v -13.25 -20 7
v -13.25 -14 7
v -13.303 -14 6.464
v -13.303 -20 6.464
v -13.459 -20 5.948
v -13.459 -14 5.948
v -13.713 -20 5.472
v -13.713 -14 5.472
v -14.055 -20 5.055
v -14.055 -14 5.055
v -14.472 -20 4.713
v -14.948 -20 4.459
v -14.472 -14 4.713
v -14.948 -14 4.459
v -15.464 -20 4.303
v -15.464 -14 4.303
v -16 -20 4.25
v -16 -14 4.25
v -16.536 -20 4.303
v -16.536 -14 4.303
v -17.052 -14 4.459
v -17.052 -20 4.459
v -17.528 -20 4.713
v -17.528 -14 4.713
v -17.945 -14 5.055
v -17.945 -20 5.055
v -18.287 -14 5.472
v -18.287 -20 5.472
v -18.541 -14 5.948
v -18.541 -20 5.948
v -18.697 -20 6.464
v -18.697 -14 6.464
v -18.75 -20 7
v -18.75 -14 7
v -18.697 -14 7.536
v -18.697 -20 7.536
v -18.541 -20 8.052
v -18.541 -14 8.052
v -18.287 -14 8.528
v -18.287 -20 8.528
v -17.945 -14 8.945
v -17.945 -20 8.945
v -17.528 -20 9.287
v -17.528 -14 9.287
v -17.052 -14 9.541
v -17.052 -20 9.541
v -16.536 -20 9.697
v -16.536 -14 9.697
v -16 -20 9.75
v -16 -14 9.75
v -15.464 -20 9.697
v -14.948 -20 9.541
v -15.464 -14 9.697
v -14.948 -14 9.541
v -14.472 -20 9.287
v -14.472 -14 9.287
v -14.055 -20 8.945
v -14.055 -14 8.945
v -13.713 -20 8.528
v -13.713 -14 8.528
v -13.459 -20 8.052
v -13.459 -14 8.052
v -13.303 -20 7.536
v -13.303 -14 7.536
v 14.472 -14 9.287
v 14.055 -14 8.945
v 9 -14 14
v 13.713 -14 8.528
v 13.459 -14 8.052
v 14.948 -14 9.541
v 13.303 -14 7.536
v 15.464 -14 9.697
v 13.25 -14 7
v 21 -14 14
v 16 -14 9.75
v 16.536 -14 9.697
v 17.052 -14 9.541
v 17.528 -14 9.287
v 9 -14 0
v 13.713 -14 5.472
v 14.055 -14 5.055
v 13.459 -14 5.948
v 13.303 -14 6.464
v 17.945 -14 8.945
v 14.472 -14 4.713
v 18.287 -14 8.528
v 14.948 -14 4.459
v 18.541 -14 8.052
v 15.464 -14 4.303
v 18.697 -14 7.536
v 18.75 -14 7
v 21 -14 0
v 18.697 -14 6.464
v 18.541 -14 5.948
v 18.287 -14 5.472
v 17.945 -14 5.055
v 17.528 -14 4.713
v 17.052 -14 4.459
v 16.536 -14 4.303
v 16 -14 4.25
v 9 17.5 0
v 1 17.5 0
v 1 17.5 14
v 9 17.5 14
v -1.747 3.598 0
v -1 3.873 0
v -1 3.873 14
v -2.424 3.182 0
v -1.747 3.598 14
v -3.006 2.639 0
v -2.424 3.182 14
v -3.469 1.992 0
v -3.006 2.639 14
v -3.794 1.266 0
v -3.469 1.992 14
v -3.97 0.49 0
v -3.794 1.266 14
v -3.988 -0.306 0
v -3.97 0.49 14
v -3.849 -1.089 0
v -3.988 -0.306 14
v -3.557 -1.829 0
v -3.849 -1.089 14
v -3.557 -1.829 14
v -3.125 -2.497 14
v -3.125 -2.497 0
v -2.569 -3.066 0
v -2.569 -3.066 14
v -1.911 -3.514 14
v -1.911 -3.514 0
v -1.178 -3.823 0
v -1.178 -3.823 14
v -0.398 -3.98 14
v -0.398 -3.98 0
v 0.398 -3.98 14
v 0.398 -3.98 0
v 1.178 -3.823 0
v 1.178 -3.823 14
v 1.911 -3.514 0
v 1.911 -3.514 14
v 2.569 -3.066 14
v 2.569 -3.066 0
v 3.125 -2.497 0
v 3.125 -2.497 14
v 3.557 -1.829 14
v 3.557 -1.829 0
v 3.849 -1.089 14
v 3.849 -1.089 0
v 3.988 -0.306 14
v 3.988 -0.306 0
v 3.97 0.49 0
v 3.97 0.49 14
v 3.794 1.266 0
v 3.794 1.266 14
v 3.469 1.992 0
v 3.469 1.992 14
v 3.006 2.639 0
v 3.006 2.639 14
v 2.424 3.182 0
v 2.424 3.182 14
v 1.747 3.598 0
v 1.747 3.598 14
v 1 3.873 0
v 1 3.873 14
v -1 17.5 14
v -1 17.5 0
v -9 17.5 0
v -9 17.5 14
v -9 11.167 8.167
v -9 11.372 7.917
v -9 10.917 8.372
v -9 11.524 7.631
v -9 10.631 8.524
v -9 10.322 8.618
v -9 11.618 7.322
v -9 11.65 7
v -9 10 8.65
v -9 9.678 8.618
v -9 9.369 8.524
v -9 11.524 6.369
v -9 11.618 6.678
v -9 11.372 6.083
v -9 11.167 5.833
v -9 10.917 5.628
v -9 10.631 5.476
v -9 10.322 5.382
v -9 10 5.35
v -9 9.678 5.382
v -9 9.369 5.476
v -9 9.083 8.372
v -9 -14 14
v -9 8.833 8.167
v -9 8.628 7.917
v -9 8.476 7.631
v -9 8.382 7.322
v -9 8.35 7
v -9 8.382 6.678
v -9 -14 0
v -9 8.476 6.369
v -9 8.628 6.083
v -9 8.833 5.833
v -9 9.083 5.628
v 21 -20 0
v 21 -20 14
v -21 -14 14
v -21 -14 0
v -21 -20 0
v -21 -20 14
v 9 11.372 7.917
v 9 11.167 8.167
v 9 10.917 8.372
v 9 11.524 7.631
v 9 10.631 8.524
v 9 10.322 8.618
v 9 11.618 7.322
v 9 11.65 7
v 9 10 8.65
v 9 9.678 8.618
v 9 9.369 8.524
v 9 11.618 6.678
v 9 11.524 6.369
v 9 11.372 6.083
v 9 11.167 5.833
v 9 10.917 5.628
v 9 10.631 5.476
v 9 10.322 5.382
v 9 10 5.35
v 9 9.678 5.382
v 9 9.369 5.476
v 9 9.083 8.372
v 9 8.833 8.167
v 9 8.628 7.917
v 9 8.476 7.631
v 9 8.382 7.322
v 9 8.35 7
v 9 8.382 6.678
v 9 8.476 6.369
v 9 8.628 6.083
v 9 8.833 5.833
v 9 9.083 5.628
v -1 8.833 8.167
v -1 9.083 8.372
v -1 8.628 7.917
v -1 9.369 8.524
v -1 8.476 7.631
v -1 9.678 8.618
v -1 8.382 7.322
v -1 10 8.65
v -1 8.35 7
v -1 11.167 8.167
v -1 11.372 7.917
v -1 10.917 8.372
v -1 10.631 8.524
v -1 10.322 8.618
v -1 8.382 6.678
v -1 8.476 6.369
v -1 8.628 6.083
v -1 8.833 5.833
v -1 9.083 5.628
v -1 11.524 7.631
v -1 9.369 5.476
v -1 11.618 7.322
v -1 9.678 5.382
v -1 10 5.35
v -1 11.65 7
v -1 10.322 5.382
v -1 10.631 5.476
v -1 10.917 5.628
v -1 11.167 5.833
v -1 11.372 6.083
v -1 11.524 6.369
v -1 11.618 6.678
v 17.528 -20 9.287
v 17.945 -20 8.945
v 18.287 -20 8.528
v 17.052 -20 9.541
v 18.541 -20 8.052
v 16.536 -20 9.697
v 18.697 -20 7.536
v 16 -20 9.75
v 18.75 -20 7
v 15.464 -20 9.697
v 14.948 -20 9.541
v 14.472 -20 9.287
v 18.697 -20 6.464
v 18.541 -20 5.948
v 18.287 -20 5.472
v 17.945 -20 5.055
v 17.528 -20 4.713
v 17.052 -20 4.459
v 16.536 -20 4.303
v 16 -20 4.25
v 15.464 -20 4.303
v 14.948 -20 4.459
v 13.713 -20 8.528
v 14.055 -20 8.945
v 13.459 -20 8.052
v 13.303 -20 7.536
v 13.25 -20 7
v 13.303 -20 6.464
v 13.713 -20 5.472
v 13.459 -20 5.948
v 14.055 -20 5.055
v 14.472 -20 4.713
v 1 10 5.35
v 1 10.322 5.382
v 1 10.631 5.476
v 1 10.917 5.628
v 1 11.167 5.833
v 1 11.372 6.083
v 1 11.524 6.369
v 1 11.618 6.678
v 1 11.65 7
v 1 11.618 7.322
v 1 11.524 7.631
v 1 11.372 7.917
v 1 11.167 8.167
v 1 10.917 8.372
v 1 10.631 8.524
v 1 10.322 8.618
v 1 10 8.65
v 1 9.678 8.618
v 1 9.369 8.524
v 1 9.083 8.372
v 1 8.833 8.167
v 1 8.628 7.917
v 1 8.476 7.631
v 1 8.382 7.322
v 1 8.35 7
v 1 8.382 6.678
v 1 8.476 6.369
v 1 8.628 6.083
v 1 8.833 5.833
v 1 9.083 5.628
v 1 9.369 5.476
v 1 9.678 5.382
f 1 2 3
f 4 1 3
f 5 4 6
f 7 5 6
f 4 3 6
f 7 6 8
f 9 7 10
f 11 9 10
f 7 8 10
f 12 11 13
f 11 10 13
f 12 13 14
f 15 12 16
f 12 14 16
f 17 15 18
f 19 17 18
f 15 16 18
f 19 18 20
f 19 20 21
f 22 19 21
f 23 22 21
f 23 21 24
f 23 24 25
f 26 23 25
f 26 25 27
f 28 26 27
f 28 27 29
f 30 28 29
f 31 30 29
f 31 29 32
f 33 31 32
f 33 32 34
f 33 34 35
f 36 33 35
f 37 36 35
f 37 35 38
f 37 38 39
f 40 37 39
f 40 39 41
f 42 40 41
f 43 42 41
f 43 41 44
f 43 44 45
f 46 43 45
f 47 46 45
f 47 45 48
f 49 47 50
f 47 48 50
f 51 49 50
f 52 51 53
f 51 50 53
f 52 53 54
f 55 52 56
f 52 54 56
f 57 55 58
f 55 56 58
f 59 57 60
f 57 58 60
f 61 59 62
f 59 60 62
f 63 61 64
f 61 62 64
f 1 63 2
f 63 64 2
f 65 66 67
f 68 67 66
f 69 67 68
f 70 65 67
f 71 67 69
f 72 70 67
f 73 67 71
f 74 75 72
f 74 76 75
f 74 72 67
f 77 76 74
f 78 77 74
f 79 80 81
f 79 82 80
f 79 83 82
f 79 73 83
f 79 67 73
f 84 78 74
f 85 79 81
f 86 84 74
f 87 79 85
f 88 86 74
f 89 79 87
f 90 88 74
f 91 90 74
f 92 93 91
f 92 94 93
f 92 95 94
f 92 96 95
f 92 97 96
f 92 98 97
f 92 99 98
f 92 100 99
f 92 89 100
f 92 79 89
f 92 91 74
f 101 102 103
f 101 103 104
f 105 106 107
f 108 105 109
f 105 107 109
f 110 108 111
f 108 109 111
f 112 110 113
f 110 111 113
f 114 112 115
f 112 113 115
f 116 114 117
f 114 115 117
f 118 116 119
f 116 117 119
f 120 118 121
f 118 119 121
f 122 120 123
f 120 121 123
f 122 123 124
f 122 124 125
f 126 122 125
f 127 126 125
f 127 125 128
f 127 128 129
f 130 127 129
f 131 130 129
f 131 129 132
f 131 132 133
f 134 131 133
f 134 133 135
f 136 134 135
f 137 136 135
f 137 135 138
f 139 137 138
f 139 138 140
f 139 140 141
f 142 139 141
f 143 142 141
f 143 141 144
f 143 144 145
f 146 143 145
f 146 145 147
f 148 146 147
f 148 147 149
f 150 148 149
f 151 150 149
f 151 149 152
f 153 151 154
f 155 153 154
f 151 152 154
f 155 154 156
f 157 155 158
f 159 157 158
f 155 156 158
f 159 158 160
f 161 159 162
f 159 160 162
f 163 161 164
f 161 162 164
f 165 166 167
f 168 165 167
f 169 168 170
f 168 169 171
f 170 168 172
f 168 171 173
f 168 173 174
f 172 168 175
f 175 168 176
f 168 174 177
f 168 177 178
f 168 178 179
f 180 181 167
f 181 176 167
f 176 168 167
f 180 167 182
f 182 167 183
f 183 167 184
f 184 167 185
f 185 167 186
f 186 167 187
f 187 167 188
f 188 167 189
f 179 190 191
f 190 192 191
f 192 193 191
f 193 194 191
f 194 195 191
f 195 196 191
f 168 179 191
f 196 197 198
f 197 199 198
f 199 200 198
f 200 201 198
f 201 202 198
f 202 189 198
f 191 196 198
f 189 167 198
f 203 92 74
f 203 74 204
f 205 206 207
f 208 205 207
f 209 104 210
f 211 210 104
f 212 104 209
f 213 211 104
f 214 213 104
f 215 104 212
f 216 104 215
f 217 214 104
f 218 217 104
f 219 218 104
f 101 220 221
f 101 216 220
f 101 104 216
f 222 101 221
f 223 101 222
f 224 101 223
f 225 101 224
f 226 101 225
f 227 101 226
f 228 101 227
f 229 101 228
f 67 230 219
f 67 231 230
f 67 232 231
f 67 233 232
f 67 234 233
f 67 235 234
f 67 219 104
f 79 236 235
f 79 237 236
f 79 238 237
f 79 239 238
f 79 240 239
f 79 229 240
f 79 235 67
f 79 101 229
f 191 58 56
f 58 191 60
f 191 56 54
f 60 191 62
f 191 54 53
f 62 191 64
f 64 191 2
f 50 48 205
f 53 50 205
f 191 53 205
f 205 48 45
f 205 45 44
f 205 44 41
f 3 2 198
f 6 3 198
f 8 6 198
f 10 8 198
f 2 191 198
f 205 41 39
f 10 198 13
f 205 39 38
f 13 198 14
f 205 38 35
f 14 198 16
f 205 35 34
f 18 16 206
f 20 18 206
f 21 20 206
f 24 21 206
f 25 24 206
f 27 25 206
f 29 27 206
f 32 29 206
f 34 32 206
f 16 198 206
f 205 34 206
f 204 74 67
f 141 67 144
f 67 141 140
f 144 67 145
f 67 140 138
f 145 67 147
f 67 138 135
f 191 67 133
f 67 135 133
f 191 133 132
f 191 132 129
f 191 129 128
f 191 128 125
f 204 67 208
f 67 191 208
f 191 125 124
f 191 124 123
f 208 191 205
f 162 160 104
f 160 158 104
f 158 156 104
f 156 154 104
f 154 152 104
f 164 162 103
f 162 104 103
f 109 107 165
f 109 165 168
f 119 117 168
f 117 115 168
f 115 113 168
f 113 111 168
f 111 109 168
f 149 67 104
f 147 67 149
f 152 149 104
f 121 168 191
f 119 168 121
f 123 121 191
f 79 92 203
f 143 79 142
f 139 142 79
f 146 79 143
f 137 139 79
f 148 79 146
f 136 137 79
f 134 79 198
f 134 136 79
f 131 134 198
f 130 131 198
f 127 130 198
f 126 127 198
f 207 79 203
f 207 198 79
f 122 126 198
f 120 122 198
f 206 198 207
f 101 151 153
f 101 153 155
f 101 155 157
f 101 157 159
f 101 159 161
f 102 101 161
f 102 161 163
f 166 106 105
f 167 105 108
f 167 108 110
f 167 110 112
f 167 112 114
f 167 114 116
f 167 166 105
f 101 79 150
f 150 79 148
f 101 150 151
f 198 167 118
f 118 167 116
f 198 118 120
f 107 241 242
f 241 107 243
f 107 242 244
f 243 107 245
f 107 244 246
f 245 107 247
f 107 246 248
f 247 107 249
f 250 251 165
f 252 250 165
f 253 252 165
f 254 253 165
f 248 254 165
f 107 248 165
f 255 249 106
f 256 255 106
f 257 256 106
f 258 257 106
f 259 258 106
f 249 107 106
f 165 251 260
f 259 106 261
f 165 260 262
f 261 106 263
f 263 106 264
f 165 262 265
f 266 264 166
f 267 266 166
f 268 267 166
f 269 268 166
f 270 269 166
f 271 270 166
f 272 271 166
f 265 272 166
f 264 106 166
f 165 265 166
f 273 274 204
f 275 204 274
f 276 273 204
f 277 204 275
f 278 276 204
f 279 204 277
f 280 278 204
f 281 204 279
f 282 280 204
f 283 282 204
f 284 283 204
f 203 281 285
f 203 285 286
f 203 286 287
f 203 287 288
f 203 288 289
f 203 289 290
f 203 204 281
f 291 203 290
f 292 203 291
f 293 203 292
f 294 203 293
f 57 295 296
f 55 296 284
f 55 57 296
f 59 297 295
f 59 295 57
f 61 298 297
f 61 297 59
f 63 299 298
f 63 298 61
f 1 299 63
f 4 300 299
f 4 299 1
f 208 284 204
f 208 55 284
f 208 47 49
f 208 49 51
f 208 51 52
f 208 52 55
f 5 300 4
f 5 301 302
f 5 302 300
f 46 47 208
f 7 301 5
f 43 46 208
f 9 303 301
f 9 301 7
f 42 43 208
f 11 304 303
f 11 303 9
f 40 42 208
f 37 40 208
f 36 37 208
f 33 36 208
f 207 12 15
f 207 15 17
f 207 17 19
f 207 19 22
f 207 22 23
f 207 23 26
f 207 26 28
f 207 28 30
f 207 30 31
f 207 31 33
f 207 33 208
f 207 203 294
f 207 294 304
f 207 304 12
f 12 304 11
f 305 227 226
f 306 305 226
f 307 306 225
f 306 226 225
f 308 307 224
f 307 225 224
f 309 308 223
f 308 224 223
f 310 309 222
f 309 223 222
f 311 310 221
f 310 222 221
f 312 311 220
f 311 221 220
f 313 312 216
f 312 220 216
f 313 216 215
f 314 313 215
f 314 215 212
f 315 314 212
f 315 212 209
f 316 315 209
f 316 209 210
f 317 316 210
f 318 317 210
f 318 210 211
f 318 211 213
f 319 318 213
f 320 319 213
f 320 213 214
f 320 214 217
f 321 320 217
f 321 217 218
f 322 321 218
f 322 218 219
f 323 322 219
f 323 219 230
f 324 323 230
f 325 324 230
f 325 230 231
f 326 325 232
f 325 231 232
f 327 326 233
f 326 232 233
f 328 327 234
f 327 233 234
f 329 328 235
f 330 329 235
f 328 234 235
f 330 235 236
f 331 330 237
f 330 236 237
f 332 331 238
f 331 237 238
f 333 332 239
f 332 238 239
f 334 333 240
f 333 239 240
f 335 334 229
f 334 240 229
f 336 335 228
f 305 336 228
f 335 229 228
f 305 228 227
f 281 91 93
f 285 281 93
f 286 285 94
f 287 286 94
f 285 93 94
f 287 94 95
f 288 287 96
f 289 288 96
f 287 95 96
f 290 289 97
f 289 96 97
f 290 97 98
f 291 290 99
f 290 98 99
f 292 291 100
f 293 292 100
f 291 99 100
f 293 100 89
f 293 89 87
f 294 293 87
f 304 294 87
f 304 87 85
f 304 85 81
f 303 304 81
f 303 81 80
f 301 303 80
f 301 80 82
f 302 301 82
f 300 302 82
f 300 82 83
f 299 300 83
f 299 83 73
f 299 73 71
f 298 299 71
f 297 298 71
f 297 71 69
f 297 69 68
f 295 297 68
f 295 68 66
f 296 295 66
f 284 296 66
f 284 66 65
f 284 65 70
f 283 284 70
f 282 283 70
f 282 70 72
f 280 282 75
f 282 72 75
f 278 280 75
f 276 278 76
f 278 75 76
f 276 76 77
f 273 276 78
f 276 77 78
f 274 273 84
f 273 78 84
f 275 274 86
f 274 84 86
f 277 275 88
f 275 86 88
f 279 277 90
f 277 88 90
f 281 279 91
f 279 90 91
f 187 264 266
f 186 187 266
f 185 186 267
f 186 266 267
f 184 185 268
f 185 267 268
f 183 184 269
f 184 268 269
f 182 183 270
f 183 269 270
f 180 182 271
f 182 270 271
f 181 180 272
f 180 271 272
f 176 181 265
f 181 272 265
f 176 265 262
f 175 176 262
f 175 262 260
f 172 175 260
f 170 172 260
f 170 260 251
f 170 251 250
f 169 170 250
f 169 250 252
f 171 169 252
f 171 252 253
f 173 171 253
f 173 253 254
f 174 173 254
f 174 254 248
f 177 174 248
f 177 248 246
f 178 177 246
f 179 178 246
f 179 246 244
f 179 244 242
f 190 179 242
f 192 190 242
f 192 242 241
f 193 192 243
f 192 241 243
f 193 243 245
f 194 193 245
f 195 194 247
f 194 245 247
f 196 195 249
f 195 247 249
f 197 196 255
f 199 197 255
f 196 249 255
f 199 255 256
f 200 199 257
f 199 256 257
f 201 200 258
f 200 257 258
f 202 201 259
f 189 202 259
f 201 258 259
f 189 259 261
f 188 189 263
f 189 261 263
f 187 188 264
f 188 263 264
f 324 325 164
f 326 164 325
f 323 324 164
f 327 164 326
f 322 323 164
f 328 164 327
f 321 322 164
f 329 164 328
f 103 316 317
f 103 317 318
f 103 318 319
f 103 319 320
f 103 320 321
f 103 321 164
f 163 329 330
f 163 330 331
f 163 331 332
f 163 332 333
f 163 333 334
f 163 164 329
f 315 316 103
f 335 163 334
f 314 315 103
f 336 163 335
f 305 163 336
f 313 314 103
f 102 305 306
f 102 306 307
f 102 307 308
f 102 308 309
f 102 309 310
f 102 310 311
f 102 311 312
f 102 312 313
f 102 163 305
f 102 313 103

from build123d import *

# Parameters (mm, degrees)
BOSS_EXTRUDE1_DEPTH         = 14
TAP_DRILL_FOR_M4X0_7_TAP2_D = 3.3
F_12_0_12_DIAMETER_HOLE1_D  = 8
TAP_DRILL_FOR_M5X0_8_TAP1_D = 5.5


with BuildPart() as part:
    # Sketch2 → Boss-Extrude1 (new body)
    with BuildSketch(Plane.XY):
        Polygon((-1, 0), (-1, 17.5), (-9, 17.5), (-9, -14), (-21, -14), (-21, -20), (0, -20), (0, 0), align=None)
    boss_extrude1 = extrude(amount=BOSS_EXTRUDE1_DEPTH)

    # Mirror1: Boss-Extrude1 across plane
    add(boss_extrude1.mirror(Plane(origin=(0, -20, 14), x_dir=(0, 0, 1), z_dir=(-1, 0, 0))))

    # Tap Drill for M4x0.7 Tap2 (through all)
    with Locations(Plane.ZY.offset(9)):
        with Locations((7, 10)):
            Hole(TAP_DRILL_FOR_M4X0_7_TAP2_D / 2)

    # Ø12.0 (12) Diameter Hole1 (through all)
    with Locations(Plane(origin=(0, 0, 0), x_dir=(1, 0, 0), z_dir=(0, 0, -1))):
        with Locations((0, 0)):
            Hole(F_12_0_12_DIAMETER_HOLE1_D / 2)

    # Tap Drill for M5x0.8 Tap1 (through all)
    with Locations(Plane(origin=(0, -20, 0), x_dir=(-1, 0, 0), z_dir=(0, -1, 0))):
        with Locations((-16, -7), (16, -7)):
            Hole(TAP_DRILL_FOR_M5X0_8_TAP1_D / 2)


solid = part.part
